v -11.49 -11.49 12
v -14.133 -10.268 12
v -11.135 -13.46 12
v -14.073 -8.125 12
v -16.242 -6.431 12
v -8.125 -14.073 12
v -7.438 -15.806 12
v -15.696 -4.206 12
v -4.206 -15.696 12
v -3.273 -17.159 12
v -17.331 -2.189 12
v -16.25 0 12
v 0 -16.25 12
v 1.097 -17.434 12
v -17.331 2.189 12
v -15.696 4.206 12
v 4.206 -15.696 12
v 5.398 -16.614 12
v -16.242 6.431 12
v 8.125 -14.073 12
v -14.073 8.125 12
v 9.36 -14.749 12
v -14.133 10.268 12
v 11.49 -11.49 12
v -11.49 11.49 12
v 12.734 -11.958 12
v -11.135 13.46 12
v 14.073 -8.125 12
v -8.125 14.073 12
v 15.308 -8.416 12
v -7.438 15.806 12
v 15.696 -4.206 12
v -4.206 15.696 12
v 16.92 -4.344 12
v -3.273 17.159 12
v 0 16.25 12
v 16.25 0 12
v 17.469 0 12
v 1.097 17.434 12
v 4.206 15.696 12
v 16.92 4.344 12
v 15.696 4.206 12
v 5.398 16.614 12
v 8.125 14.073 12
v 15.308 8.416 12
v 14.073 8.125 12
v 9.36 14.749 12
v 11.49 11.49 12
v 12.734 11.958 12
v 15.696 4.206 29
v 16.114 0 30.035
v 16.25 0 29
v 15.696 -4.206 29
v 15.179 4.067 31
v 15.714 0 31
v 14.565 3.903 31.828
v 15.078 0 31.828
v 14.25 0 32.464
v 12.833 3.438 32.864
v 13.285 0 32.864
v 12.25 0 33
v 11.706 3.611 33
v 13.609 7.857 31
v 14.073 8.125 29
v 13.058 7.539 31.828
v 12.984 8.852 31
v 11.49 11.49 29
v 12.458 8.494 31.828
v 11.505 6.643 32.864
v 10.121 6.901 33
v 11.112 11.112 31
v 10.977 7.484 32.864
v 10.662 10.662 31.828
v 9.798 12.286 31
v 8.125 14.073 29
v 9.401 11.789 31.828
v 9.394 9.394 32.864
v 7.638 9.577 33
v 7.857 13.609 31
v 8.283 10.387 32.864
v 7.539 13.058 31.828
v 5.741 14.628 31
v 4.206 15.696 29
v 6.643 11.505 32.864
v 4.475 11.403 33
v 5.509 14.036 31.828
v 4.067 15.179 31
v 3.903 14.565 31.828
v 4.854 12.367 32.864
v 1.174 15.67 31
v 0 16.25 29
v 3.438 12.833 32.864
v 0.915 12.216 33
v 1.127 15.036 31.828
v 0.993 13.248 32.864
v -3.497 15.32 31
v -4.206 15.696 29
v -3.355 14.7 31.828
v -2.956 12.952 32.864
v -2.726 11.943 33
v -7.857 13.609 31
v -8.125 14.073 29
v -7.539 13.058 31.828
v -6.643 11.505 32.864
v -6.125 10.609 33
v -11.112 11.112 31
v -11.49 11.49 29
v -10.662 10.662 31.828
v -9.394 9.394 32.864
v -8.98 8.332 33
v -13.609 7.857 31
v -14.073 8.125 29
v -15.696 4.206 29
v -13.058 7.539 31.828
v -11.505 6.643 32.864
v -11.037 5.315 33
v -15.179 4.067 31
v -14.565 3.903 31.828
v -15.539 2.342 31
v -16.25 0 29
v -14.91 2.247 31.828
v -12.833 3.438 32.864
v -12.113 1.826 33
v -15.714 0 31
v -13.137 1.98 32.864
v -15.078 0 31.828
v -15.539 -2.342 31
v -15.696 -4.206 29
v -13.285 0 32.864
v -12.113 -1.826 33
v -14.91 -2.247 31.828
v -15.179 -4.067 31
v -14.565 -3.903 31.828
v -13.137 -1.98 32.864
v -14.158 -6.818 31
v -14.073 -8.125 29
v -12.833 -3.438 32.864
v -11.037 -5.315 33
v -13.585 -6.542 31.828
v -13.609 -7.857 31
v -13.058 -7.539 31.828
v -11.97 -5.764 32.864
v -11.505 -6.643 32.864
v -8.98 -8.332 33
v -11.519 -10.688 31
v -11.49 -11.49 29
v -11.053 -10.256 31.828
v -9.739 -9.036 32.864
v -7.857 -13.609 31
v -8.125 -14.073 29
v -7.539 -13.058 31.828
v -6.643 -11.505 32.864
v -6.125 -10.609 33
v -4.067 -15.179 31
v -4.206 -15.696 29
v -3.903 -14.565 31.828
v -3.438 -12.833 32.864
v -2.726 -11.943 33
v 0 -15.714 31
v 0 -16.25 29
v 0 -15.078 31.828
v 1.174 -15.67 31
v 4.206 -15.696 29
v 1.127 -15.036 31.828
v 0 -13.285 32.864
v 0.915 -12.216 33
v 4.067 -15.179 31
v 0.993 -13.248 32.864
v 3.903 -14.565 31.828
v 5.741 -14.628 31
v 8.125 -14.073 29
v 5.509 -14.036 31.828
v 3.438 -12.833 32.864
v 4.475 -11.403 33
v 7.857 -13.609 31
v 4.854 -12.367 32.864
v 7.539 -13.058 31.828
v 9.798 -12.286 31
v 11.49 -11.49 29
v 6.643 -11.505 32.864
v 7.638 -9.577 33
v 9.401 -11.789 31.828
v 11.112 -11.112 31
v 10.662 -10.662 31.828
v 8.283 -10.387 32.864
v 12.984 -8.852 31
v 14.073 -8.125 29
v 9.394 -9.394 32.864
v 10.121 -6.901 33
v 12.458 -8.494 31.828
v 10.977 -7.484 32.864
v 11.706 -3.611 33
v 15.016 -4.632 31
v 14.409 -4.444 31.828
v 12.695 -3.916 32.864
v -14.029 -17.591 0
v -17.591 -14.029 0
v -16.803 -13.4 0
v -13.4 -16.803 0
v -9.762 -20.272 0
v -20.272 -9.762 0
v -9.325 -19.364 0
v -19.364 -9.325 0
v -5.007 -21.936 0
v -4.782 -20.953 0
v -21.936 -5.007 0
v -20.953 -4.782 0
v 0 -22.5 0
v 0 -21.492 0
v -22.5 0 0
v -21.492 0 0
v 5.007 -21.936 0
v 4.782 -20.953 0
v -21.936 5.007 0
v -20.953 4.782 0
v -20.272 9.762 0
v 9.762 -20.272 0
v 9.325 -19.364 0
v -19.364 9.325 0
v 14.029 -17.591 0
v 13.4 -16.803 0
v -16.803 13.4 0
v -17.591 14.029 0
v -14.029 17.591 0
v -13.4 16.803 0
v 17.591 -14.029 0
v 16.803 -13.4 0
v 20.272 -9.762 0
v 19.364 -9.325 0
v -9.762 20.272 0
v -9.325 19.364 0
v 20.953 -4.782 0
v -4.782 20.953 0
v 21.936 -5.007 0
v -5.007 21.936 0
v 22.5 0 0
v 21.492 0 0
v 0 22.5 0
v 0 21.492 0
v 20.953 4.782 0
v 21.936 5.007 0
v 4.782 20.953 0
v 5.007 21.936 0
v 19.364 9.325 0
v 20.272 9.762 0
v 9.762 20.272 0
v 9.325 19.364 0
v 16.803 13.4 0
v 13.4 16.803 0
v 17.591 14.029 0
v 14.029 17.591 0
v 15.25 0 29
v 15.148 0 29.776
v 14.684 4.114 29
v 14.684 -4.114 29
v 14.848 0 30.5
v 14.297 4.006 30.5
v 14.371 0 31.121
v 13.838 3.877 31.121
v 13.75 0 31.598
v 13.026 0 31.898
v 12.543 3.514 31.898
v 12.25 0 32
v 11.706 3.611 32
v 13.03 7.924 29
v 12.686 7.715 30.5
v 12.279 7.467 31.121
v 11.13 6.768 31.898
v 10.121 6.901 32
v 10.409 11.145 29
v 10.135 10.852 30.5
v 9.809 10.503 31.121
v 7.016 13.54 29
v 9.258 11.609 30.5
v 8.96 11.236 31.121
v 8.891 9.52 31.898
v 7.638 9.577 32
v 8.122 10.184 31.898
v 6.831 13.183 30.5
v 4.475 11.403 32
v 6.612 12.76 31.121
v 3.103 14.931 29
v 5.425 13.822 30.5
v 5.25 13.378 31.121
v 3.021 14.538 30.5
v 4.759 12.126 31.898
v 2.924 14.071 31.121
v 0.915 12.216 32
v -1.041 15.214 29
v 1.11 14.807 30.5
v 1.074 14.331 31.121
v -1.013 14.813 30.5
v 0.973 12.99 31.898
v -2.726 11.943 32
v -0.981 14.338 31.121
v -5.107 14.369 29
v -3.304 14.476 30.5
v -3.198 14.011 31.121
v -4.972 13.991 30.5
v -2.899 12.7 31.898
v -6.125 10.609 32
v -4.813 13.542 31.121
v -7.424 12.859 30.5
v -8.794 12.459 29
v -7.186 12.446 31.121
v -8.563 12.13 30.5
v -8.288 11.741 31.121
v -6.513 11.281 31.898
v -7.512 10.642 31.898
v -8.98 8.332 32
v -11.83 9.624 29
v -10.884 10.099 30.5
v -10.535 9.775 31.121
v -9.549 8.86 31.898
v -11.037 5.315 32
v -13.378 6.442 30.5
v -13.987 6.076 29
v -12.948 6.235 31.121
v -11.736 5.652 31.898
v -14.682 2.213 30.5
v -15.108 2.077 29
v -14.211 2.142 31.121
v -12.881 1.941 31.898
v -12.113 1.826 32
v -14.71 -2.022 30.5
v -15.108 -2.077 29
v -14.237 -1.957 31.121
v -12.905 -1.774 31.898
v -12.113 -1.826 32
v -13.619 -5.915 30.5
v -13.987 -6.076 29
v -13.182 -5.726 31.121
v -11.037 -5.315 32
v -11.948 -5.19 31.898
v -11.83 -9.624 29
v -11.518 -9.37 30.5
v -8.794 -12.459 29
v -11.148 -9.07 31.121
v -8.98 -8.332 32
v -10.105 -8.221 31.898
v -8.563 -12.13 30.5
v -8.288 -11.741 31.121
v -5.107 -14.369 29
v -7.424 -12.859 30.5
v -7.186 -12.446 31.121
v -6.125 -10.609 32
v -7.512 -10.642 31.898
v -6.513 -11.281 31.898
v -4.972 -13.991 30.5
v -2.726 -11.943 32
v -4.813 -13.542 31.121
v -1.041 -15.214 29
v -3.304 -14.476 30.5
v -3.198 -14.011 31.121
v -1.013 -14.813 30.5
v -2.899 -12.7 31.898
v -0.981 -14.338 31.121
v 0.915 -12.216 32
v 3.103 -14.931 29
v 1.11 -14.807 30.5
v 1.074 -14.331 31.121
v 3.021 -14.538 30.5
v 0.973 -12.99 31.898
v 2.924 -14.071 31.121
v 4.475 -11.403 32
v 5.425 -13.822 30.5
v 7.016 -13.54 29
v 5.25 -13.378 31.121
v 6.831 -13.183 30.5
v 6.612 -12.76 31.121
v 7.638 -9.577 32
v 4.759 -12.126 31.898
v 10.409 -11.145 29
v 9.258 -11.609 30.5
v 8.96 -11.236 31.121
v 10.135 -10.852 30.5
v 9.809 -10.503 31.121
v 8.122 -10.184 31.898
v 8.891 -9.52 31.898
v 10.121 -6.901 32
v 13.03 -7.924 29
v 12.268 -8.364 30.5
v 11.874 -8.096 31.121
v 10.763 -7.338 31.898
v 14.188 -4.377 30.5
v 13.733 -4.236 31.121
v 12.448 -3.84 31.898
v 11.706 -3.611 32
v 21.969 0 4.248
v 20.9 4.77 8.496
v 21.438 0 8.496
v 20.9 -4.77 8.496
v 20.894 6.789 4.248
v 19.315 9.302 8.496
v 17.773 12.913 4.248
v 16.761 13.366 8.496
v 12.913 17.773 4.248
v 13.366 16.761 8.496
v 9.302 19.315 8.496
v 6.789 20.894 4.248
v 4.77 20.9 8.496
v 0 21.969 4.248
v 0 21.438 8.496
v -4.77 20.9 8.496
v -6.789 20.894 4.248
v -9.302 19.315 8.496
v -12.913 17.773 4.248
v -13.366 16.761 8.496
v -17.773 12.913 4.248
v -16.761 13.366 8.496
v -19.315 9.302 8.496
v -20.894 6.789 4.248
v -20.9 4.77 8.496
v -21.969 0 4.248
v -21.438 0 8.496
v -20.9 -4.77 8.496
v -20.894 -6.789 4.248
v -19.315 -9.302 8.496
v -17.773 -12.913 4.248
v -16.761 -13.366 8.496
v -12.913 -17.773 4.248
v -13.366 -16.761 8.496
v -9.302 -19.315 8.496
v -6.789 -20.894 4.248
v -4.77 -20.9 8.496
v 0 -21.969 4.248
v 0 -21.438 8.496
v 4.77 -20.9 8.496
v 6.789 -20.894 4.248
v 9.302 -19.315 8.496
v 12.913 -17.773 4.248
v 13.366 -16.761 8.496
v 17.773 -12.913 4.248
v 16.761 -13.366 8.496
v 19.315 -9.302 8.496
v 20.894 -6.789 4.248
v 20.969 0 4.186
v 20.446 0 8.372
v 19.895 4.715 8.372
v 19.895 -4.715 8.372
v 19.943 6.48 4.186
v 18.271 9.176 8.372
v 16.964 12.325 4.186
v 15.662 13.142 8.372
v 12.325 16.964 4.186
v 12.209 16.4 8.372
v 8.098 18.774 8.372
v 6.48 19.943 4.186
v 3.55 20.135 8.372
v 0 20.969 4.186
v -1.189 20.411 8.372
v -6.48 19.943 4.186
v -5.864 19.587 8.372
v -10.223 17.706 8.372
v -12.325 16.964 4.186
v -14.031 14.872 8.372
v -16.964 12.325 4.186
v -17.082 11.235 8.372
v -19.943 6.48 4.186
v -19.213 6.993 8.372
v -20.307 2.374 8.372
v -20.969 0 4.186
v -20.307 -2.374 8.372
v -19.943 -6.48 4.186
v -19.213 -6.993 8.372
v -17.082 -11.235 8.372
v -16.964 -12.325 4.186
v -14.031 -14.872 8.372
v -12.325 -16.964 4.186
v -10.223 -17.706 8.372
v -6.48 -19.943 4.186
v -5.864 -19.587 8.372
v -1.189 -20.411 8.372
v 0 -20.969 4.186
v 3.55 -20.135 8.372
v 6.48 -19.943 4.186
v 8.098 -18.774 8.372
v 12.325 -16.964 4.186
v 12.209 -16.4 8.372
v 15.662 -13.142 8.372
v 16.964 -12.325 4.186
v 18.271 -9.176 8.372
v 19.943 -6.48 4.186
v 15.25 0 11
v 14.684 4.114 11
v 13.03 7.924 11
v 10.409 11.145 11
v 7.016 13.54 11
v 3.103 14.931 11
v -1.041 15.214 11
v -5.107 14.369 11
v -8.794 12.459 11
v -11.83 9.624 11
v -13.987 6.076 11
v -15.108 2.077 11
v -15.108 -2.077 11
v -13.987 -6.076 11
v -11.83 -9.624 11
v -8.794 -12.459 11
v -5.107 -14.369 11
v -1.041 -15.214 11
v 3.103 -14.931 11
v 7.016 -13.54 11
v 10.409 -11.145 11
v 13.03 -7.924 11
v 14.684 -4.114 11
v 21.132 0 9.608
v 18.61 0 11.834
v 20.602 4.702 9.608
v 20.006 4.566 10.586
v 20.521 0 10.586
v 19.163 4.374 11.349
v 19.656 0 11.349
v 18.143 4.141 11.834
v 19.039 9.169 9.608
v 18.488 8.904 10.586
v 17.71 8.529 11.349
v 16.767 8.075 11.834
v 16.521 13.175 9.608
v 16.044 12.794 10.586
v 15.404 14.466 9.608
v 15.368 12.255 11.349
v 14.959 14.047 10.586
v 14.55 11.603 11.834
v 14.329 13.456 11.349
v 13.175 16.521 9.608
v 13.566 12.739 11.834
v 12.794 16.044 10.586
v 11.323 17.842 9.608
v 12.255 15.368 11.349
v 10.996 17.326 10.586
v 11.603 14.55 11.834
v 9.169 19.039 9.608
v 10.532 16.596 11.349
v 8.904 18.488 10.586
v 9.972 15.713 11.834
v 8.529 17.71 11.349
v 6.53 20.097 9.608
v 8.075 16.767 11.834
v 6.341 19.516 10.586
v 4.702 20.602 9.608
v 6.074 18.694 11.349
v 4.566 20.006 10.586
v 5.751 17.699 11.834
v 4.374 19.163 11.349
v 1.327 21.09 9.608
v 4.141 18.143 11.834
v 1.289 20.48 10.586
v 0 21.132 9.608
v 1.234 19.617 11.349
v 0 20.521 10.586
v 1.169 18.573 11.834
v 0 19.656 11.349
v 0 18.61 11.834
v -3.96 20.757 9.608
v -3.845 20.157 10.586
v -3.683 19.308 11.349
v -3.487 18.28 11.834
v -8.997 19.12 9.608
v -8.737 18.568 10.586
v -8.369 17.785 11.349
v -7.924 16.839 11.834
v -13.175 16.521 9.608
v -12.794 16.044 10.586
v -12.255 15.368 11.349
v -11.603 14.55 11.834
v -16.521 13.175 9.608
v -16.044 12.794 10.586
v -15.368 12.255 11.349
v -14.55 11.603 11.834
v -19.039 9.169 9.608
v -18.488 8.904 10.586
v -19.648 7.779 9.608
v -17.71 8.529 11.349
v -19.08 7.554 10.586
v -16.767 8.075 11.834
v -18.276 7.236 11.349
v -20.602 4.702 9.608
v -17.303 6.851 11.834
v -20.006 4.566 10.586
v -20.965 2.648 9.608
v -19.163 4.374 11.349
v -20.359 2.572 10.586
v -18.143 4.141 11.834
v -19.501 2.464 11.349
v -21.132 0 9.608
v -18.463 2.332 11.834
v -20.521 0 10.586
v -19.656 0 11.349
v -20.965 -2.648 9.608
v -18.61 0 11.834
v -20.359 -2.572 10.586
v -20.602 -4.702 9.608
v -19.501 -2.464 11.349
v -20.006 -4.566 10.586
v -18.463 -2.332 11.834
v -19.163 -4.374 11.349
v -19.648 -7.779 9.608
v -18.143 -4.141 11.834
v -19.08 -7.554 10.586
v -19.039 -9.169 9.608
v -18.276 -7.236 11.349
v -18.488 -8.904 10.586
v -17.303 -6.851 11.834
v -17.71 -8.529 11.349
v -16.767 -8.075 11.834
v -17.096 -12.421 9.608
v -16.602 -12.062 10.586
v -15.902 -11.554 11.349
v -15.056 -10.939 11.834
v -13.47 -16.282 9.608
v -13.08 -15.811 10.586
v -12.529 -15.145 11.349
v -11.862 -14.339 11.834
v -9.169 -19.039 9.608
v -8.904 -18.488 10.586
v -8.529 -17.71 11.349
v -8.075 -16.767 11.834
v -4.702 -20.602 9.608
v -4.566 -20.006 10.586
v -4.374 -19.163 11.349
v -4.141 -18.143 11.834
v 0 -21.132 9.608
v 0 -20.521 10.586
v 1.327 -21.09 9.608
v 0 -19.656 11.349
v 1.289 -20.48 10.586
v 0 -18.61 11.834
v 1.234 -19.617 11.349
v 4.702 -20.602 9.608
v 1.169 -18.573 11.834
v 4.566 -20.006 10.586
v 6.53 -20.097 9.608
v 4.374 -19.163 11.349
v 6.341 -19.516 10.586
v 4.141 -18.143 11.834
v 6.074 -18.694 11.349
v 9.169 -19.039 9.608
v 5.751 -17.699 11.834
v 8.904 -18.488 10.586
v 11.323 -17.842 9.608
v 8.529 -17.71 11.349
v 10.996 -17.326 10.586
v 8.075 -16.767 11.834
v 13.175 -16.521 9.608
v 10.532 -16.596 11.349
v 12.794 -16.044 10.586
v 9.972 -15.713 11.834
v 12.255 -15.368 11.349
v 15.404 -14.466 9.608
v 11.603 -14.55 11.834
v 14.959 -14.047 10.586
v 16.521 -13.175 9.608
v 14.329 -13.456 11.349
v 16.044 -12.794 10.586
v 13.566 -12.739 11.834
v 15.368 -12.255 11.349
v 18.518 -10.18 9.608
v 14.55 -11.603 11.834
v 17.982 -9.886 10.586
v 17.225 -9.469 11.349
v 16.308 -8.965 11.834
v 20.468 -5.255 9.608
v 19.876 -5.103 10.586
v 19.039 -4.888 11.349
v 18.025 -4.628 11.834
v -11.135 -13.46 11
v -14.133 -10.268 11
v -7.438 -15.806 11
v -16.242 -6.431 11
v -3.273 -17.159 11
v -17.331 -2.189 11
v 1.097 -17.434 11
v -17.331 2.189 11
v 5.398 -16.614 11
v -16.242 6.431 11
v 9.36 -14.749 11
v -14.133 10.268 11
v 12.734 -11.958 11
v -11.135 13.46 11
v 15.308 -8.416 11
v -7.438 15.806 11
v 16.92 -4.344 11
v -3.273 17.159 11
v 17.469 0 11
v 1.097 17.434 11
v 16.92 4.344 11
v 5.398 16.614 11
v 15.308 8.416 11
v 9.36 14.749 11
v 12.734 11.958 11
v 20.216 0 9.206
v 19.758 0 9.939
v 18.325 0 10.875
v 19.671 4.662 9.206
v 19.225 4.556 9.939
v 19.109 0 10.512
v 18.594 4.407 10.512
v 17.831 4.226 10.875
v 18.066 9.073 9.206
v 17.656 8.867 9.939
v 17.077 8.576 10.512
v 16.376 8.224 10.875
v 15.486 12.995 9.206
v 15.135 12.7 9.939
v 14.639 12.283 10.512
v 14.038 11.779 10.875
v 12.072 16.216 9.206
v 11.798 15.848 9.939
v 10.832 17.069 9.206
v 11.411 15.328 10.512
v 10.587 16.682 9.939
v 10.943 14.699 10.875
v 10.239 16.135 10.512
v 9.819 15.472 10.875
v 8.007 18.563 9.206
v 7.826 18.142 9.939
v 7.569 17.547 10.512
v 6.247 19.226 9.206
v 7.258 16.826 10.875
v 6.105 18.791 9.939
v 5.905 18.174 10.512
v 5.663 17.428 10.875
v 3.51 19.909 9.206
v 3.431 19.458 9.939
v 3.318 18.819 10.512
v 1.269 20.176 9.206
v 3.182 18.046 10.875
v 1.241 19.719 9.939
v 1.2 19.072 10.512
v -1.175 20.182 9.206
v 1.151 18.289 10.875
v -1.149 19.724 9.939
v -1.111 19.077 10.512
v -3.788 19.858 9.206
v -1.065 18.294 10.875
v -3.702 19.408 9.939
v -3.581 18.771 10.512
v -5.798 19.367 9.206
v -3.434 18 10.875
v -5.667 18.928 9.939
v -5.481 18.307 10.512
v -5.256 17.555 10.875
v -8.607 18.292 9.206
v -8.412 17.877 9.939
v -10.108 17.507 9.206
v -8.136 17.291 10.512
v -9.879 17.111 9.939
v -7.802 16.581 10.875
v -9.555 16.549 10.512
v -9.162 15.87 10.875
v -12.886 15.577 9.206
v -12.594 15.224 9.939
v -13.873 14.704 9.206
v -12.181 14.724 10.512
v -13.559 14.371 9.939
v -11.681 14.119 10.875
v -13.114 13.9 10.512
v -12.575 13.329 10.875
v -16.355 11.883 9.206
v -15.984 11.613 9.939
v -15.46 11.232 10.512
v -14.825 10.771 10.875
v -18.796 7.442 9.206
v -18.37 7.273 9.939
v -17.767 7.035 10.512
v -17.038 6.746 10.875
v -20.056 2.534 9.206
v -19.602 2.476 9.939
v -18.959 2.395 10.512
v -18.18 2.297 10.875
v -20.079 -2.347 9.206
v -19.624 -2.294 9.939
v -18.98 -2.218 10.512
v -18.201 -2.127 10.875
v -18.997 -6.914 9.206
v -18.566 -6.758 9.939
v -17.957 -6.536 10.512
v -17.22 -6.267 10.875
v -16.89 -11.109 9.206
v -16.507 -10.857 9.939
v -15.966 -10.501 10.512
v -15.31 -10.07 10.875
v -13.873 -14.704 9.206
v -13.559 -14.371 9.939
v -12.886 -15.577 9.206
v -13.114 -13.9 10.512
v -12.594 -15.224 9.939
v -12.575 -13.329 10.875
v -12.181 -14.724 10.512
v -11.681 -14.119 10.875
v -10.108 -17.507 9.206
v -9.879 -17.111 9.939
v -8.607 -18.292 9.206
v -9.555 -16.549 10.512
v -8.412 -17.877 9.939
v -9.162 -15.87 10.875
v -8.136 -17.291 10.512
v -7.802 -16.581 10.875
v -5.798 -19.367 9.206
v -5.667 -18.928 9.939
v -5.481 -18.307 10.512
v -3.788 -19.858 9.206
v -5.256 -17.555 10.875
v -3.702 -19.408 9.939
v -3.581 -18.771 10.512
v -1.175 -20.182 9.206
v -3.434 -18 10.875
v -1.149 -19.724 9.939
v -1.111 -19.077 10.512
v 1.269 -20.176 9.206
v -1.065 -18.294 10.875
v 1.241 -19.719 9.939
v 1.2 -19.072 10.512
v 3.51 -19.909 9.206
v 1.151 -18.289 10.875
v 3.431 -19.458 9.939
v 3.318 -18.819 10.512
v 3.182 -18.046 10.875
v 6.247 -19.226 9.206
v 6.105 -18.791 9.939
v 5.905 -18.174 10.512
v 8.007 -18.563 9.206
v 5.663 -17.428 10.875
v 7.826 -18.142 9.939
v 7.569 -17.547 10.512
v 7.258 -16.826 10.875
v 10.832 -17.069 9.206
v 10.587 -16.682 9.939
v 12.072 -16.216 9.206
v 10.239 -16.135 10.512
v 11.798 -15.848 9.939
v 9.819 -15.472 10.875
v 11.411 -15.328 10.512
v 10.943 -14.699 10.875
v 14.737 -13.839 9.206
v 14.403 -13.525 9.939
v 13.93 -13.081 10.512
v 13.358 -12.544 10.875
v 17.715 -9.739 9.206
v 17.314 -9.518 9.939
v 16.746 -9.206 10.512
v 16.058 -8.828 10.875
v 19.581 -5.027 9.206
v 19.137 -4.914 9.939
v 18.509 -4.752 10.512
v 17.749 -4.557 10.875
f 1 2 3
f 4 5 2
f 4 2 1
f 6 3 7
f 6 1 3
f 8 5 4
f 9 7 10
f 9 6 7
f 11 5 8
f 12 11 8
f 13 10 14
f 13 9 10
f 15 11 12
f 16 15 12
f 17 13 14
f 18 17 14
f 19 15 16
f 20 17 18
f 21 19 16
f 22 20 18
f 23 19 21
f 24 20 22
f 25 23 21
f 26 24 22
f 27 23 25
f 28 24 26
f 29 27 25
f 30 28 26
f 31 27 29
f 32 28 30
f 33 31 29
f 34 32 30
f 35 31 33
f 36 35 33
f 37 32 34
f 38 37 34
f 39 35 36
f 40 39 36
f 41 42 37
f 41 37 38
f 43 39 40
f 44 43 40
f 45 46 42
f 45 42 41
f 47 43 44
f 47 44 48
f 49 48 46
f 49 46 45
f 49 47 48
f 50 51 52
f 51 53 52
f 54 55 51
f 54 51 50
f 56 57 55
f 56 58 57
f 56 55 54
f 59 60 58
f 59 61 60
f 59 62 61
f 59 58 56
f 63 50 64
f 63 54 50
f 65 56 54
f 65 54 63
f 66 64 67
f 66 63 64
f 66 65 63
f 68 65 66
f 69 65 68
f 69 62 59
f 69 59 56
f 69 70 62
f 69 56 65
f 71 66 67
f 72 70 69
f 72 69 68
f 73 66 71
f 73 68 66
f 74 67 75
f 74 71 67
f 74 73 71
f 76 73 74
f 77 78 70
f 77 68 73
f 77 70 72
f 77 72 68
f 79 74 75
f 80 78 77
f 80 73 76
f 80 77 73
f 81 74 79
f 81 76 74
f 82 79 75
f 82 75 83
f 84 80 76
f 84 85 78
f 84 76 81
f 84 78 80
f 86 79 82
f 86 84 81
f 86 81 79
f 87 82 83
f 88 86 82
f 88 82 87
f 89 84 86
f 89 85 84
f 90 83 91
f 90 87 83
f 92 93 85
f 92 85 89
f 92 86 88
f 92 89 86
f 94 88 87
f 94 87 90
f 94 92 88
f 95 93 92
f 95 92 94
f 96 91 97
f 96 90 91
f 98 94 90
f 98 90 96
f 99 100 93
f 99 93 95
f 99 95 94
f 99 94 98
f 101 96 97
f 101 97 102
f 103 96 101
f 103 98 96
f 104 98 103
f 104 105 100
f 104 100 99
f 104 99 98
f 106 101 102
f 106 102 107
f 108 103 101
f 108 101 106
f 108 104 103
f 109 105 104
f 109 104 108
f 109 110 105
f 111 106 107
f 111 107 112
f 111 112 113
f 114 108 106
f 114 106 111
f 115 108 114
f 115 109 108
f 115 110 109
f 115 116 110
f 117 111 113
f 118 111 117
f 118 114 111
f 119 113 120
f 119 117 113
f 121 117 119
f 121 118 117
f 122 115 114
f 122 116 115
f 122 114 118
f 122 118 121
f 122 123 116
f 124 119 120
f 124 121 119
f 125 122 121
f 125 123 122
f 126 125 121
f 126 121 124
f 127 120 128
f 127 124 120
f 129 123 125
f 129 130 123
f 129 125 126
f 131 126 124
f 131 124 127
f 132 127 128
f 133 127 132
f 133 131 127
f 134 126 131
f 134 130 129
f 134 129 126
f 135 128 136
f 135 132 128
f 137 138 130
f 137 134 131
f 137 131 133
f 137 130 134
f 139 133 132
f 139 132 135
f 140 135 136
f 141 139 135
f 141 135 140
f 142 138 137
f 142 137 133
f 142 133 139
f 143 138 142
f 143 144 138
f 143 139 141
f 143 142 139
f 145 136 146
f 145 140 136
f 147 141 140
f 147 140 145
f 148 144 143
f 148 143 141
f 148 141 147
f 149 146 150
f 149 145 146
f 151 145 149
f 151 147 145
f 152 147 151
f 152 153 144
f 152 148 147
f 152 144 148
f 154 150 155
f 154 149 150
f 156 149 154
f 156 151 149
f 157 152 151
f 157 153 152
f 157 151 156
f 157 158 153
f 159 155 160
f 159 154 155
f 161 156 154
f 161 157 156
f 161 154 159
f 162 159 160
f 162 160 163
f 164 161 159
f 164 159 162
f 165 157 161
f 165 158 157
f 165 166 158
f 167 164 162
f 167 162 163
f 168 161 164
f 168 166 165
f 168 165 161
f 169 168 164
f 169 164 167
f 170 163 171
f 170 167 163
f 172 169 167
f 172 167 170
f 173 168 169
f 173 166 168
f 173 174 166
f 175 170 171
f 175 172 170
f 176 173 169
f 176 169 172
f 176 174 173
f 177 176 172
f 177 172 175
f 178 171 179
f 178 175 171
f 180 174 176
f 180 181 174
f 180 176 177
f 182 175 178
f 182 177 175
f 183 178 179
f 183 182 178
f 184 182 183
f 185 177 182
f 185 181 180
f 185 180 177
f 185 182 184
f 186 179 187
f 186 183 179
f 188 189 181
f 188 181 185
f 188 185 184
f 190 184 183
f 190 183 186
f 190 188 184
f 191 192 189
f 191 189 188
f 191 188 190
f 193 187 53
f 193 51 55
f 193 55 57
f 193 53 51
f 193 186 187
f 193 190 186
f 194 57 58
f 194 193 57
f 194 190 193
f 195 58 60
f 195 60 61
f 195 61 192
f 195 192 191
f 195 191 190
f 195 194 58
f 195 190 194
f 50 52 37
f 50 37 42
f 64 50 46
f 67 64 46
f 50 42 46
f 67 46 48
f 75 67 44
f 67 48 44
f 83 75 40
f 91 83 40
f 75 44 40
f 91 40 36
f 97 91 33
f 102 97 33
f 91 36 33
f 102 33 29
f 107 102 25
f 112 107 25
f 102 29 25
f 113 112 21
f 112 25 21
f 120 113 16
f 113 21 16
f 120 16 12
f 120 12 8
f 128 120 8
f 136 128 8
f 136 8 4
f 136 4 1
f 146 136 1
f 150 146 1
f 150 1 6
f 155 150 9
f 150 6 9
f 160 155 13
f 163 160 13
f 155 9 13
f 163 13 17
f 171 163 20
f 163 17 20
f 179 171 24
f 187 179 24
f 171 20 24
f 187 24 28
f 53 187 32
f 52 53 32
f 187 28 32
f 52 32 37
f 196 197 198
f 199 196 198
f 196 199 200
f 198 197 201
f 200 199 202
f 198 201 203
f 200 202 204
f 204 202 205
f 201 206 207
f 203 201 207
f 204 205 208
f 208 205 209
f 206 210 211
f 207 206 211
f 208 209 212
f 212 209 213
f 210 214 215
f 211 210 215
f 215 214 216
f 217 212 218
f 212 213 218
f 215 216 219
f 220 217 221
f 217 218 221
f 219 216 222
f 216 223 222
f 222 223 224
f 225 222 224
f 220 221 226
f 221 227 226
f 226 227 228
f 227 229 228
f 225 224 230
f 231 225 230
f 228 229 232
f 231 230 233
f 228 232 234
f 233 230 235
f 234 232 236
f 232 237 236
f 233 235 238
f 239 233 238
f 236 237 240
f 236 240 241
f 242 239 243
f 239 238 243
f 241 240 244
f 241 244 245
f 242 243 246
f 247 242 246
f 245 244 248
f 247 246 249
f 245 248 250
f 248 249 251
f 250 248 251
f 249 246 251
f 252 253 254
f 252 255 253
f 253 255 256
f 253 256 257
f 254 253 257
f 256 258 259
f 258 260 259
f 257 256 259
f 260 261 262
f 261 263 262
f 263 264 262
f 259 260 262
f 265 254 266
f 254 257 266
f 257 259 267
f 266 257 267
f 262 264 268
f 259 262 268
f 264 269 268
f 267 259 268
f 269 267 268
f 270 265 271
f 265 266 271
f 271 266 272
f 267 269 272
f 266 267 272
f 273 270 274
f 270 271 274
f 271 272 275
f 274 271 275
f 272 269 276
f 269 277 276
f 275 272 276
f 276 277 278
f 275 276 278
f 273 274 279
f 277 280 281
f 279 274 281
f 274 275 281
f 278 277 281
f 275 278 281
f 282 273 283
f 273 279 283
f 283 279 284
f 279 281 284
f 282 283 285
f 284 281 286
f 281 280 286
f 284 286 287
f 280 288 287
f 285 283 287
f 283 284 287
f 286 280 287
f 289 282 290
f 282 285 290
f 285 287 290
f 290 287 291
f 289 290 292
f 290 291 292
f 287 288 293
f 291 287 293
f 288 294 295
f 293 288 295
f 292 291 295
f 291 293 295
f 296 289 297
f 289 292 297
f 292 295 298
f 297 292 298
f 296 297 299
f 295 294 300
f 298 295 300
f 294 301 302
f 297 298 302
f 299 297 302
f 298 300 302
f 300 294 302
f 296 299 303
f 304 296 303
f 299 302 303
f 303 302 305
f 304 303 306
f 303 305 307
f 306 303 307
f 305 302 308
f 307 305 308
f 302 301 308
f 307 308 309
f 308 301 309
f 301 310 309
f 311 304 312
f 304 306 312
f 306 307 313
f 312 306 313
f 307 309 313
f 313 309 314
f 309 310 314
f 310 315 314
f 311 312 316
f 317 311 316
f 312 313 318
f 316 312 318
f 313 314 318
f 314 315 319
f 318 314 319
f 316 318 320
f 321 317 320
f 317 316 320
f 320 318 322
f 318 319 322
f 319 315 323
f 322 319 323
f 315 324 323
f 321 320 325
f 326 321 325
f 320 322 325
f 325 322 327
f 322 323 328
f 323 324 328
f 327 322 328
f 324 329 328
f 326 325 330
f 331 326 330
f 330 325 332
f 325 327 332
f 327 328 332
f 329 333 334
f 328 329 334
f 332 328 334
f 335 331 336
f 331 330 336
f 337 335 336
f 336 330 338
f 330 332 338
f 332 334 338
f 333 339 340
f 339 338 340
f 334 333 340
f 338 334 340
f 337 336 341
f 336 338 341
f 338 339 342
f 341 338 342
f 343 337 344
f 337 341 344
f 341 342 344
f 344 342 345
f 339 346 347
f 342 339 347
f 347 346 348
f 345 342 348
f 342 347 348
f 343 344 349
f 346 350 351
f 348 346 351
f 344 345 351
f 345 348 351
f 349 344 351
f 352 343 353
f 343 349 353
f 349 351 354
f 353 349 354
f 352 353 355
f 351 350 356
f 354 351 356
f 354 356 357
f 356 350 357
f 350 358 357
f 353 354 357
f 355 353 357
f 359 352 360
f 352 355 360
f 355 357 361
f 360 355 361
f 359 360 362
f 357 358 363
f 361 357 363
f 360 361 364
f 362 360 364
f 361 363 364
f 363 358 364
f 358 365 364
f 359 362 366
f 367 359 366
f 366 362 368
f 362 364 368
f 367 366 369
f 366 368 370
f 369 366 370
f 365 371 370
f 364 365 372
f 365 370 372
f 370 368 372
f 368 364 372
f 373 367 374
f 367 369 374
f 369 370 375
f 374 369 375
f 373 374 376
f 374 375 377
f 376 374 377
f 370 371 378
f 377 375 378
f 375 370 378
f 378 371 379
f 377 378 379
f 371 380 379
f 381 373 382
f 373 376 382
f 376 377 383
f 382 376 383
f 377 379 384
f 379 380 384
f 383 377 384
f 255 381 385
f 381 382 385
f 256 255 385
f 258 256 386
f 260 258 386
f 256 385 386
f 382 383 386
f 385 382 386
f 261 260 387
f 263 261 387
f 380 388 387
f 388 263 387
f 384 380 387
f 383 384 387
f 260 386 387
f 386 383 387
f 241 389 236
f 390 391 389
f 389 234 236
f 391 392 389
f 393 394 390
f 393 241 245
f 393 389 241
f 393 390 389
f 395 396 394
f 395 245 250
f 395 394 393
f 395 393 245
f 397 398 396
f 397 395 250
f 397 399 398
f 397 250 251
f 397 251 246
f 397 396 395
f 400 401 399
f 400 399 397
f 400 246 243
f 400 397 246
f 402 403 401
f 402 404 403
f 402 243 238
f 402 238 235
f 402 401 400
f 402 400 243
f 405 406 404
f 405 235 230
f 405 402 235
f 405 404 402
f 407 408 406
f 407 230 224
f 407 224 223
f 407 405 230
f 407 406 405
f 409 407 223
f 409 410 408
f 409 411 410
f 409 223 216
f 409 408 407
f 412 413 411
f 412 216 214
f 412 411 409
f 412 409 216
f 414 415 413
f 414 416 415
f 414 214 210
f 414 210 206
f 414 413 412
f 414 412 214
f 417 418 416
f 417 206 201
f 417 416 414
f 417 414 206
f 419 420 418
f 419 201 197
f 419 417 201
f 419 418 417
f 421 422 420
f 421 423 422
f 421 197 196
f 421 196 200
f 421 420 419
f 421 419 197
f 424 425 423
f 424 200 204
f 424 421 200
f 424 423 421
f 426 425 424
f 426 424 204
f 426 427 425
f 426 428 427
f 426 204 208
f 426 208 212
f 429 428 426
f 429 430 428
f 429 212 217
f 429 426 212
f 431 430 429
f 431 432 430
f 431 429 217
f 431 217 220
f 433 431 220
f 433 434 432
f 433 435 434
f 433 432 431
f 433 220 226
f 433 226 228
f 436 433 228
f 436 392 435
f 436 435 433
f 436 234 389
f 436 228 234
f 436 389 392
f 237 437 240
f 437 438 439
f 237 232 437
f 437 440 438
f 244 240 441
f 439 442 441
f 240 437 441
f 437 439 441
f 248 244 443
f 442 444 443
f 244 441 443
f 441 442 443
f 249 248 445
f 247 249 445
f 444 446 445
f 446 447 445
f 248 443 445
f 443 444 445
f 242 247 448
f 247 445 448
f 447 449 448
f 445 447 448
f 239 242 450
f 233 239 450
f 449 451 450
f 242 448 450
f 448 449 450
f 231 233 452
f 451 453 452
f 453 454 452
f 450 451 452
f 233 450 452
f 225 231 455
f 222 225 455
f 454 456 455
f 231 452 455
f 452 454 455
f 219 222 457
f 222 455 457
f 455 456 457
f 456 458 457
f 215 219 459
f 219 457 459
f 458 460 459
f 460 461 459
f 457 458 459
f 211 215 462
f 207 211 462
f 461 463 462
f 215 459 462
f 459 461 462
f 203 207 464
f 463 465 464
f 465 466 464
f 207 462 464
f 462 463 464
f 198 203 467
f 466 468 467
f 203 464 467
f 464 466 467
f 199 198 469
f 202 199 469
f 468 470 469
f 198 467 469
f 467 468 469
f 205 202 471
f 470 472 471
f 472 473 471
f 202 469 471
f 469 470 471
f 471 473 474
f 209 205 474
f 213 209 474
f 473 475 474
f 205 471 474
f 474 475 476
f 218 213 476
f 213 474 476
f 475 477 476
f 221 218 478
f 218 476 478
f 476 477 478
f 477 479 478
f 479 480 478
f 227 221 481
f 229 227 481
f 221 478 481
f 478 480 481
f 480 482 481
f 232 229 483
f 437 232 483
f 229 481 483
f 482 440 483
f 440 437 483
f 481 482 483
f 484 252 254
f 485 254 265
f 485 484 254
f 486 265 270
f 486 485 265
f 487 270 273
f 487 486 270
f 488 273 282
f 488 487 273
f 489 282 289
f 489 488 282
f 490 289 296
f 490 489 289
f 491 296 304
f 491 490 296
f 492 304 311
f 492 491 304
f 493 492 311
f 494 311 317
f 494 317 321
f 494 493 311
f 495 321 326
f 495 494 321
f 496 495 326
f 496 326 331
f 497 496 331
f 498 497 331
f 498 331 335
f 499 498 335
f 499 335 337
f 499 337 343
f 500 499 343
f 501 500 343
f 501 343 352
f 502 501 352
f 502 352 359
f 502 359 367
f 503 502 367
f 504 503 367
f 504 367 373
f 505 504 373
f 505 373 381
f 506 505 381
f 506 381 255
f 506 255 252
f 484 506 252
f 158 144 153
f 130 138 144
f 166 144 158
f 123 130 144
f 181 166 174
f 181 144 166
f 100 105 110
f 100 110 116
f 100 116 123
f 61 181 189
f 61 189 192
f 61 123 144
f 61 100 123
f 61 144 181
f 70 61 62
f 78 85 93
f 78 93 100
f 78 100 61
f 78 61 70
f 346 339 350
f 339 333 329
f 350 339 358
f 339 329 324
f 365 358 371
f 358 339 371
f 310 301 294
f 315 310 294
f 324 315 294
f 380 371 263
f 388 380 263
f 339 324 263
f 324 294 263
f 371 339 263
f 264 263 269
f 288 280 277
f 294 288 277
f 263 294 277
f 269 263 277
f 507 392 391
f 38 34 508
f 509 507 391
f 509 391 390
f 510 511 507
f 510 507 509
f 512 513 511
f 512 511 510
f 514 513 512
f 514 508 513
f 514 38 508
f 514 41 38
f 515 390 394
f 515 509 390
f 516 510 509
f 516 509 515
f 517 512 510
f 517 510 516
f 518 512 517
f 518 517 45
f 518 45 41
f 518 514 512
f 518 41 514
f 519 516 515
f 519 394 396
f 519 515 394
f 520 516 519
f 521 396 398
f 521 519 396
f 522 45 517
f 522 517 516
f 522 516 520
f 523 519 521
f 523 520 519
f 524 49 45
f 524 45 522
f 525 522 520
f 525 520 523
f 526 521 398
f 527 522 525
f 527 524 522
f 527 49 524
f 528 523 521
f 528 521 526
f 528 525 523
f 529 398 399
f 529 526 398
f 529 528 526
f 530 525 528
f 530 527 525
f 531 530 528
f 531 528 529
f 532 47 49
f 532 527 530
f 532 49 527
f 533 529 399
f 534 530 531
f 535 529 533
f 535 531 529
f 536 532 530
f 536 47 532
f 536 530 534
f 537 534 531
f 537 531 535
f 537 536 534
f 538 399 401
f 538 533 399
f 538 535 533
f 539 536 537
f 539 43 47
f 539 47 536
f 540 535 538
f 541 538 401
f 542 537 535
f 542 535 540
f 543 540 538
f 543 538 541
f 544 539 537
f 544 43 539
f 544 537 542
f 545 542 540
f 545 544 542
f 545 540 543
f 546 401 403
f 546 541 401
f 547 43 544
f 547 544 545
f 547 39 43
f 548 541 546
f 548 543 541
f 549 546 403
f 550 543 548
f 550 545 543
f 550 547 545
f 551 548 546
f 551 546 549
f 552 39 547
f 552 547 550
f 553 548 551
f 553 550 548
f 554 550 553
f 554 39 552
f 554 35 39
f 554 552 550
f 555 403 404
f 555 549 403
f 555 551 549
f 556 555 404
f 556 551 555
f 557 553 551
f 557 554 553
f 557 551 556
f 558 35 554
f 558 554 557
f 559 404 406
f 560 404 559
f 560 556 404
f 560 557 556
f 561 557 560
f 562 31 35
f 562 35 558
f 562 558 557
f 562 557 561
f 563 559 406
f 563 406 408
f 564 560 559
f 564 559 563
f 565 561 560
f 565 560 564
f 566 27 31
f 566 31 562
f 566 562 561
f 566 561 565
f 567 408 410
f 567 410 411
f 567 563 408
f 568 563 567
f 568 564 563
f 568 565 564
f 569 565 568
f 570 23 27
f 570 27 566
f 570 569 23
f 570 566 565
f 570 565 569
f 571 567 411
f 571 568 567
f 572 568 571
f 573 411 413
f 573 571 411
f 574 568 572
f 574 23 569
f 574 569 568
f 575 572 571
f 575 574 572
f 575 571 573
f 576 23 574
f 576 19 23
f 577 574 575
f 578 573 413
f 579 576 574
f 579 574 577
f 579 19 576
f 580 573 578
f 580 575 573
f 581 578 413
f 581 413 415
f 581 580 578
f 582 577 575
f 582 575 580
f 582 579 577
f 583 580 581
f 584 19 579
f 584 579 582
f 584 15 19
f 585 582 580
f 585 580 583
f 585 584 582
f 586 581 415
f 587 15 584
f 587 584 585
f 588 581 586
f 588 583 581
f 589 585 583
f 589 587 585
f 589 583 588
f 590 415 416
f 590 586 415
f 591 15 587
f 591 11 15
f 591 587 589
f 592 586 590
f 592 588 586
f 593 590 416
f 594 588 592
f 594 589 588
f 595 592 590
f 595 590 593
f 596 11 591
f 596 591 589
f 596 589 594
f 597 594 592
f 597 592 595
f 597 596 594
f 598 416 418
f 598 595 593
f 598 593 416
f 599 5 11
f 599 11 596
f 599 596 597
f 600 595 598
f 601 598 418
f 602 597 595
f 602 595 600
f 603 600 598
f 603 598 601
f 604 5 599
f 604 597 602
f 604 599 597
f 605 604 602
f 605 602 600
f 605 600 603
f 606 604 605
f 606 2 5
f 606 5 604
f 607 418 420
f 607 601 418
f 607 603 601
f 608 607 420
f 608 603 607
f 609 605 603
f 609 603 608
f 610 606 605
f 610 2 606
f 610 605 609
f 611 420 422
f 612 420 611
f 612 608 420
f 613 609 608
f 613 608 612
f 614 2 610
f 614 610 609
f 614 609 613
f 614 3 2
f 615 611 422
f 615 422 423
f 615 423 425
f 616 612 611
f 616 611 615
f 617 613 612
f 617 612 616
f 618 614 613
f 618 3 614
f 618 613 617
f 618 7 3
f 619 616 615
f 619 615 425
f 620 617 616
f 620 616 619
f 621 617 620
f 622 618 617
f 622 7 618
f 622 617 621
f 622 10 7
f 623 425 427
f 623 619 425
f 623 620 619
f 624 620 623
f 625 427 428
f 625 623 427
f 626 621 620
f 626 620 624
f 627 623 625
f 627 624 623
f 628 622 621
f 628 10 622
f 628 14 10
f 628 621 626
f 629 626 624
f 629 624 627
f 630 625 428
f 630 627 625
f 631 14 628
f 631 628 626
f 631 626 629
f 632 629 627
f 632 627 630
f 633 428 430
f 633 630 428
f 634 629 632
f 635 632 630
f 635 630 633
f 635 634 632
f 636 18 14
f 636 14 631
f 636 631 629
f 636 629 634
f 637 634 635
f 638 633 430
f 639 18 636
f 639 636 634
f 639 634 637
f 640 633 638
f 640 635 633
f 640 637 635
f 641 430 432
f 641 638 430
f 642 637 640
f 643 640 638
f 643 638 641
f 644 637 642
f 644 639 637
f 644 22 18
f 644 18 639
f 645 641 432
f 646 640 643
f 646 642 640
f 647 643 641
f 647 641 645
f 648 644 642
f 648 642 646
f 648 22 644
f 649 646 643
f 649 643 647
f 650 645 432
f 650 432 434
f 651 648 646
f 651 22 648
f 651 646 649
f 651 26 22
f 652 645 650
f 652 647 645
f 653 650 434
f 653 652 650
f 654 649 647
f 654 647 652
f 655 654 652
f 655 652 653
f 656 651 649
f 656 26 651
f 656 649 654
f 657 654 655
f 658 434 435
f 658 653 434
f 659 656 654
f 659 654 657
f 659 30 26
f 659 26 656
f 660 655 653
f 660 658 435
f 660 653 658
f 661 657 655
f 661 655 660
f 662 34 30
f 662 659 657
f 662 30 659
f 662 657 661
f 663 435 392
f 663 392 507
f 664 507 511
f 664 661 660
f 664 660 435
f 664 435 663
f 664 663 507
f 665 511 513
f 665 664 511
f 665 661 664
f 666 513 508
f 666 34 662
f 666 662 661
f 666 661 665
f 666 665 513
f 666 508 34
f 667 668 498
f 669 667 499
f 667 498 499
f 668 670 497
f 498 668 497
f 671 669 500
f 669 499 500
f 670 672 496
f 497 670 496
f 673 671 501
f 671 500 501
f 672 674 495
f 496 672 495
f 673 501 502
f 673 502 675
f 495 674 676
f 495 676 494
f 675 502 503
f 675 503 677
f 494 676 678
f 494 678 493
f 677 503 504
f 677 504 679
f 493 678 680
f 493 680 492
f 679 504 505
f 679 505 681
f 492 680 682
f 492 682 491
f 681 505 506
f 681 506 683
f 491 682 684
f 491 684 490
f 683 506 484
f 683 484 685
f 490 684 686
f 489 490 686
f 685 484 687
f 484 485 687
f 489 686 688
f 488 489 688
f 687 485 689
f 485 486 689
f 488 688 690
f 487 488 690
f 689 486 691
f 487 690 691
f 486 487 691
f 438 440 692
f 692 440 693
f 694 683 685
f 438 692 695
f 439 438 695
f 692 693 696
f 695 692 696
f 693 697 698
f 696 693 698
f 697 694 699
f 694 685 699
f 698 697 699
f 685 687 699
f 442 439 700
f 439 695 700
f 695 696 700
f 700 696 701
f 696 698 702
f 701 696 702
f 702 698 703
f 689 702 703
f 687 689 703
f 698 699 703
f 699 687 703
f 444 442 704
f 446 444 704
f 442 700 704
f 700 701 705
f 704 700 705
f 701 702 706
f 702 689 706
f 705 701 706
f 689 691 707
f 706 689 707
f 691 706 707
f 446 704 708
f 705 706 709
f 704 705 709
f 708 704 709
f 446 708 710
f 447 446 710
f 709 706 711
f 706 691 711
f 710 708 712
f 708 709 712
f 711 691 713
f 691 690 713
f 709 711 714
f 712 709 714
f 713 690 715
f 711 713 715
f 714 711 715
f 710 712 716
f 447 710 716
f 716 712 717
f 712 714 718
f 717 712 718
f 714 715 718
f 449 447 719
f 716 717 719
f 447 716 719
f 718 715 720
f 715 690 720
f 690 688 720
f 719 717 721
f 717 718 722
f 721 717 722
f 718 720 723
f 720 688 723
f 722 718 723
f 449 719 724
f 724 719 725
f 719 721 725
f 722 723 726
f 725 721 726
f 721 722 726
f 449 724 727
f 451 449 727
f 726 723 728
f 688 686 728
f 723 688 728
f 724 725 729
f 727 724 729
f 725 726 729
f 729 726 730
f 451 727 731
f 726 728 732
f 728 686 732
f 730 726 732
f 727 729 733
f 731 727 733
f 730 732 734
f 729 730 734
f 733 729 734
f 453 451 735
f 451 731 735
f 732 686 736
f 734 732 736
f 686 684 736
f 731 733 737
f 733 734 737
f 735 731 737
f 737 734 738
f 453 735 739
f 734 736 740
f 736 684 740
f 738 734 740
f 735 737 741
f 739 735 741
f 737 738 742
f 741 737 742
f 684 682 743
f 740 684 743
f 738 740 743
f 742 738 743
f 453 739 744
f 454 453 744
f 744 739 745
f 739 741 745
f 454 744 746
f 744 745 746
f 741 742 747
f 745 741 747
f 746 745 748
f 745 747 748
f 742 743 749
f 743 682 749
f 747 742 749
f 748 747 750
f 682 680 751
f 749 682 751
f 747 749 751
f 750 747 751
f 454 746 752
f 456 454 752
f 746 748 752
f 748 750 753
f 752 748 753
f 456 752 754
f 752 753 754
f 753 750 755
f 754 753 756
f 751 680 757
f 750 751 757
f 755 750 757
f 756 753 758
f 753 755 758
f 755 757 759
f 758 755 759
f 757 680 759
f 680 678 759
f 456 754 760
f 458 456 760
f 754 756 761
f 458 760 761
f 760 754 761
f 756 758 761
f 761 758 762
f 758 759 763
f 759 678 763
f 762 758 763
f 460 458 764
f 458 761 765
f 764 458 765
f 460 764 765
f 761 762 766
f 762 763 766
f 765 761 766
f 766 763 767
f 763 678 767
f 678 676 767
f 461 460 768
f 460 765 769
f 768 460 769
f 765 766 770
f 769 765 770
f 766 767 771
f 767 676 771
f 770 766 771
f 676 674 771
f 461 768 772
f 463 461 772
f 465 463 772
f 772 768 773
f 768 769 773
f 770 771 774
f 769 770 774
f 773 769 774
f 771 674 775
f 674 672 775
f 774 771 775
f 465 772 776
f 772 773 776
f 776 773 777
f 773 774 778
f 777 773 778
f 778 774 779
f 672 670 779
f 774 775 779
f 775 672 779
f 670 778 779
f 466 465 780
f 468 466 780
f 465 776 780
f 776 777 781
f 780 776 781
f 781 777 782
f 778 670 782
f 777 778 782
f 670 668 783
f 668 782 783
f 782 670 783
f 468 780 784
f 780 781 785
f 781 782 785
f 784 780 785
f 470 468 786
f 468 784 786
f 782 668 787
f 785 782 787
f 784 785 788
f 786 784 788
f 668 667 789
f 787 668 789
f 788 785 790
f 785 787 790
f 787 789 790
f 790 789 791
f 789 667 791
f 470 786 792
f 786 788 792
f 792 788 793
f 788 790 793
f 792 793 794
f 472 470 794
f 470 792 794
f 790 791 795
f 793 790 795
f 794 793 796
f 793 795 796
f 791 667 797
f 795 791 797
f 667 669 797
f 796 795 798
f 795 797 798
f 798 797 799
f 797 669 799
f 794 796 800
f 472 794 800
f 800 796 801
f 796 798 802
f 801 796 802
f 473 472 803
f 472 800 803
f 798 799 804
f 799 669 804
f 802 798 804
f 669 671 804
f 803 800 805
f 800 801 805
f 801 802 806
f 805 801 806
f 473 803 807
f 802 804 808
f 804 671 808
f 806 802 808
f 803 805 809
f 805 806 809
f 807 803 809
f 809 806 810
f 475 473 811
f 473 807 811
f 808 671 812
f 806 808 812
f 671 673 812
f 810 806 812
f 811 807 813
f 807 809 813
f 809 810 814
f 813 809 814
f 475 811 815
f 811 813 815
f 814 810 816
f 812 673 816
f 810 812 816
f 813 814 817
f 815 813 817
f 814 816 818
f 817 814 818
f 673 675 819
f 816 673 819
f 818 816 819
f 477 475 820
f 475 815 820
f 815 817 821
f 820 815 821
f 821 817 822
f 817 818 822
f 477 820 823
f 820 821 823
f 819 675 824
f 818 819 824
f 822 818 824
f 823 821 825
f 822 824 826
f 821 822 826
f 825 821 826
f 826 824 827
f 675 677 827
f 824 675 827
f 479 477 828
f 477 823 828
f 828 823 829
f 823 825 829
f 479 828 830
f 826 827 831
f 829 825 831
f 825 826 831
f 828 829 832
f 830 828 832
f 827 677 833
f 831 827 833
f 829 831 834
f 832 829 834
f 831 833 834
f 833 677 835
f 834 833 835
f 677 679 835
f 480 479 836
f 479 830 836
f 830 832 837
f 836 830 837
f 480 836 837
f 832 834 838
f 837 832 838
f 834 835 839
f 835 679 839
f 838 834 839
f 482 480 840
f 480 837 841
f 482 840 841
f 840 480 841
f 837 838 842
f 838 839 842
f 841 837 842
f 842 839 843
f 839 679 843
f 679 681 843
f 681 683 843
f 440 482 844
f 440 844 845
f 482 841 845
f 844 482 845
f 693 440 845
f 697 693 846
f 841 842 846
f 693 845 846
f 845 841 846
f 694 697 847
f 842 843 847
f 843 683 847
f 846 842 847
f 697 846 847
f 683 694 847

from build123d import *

# Parameters (mm, degrees)
F0_R     = 22.5
F2_R     = 21
F4_R     = 4
F5_R     = 16.25
F6_DEPTH = 21
F7_R     = 4
F8_T     = -1


with BuildPart() as f3:
    # F0 (on Top) → F3 section 0
    with BuildSketch(Plane.XY):
        Circle(F0_R)
    # F2 (on offset) → F3 section 1
    with BuildSketch(Plane.XY.offset(12)):
        Circle(F2_R)
    loft()

    # F4
    f4_edges = [f3.edges().sort_by_distance(p)[0] for p in [
        (-21, 0, 12),
    ]]
    fillet(f4_edges, radius=F4_R)

    # F5 (on face) → F6 (join)
    with BuildSketch(Plane.XY.offset(12)):
        Circle(F5_R)
    extrude(amount=F6_DEPTH)

    # F7
    f7_edges = [f3.edges().sort_by_distance(p)[0] for p in [
        (-16.25, 0, 33),
    ]]
    fillet(f7_edges, radius=F7_R)

    # F8
    f8_openings = [f3.faces().sort_by_distance(p)[0] for p in [
        (0, 0, 0),
    ]]
    offset(amount=F8_T, openings=f8_openings, kind=Kind.INTERSECTION)


solid = f3.part
